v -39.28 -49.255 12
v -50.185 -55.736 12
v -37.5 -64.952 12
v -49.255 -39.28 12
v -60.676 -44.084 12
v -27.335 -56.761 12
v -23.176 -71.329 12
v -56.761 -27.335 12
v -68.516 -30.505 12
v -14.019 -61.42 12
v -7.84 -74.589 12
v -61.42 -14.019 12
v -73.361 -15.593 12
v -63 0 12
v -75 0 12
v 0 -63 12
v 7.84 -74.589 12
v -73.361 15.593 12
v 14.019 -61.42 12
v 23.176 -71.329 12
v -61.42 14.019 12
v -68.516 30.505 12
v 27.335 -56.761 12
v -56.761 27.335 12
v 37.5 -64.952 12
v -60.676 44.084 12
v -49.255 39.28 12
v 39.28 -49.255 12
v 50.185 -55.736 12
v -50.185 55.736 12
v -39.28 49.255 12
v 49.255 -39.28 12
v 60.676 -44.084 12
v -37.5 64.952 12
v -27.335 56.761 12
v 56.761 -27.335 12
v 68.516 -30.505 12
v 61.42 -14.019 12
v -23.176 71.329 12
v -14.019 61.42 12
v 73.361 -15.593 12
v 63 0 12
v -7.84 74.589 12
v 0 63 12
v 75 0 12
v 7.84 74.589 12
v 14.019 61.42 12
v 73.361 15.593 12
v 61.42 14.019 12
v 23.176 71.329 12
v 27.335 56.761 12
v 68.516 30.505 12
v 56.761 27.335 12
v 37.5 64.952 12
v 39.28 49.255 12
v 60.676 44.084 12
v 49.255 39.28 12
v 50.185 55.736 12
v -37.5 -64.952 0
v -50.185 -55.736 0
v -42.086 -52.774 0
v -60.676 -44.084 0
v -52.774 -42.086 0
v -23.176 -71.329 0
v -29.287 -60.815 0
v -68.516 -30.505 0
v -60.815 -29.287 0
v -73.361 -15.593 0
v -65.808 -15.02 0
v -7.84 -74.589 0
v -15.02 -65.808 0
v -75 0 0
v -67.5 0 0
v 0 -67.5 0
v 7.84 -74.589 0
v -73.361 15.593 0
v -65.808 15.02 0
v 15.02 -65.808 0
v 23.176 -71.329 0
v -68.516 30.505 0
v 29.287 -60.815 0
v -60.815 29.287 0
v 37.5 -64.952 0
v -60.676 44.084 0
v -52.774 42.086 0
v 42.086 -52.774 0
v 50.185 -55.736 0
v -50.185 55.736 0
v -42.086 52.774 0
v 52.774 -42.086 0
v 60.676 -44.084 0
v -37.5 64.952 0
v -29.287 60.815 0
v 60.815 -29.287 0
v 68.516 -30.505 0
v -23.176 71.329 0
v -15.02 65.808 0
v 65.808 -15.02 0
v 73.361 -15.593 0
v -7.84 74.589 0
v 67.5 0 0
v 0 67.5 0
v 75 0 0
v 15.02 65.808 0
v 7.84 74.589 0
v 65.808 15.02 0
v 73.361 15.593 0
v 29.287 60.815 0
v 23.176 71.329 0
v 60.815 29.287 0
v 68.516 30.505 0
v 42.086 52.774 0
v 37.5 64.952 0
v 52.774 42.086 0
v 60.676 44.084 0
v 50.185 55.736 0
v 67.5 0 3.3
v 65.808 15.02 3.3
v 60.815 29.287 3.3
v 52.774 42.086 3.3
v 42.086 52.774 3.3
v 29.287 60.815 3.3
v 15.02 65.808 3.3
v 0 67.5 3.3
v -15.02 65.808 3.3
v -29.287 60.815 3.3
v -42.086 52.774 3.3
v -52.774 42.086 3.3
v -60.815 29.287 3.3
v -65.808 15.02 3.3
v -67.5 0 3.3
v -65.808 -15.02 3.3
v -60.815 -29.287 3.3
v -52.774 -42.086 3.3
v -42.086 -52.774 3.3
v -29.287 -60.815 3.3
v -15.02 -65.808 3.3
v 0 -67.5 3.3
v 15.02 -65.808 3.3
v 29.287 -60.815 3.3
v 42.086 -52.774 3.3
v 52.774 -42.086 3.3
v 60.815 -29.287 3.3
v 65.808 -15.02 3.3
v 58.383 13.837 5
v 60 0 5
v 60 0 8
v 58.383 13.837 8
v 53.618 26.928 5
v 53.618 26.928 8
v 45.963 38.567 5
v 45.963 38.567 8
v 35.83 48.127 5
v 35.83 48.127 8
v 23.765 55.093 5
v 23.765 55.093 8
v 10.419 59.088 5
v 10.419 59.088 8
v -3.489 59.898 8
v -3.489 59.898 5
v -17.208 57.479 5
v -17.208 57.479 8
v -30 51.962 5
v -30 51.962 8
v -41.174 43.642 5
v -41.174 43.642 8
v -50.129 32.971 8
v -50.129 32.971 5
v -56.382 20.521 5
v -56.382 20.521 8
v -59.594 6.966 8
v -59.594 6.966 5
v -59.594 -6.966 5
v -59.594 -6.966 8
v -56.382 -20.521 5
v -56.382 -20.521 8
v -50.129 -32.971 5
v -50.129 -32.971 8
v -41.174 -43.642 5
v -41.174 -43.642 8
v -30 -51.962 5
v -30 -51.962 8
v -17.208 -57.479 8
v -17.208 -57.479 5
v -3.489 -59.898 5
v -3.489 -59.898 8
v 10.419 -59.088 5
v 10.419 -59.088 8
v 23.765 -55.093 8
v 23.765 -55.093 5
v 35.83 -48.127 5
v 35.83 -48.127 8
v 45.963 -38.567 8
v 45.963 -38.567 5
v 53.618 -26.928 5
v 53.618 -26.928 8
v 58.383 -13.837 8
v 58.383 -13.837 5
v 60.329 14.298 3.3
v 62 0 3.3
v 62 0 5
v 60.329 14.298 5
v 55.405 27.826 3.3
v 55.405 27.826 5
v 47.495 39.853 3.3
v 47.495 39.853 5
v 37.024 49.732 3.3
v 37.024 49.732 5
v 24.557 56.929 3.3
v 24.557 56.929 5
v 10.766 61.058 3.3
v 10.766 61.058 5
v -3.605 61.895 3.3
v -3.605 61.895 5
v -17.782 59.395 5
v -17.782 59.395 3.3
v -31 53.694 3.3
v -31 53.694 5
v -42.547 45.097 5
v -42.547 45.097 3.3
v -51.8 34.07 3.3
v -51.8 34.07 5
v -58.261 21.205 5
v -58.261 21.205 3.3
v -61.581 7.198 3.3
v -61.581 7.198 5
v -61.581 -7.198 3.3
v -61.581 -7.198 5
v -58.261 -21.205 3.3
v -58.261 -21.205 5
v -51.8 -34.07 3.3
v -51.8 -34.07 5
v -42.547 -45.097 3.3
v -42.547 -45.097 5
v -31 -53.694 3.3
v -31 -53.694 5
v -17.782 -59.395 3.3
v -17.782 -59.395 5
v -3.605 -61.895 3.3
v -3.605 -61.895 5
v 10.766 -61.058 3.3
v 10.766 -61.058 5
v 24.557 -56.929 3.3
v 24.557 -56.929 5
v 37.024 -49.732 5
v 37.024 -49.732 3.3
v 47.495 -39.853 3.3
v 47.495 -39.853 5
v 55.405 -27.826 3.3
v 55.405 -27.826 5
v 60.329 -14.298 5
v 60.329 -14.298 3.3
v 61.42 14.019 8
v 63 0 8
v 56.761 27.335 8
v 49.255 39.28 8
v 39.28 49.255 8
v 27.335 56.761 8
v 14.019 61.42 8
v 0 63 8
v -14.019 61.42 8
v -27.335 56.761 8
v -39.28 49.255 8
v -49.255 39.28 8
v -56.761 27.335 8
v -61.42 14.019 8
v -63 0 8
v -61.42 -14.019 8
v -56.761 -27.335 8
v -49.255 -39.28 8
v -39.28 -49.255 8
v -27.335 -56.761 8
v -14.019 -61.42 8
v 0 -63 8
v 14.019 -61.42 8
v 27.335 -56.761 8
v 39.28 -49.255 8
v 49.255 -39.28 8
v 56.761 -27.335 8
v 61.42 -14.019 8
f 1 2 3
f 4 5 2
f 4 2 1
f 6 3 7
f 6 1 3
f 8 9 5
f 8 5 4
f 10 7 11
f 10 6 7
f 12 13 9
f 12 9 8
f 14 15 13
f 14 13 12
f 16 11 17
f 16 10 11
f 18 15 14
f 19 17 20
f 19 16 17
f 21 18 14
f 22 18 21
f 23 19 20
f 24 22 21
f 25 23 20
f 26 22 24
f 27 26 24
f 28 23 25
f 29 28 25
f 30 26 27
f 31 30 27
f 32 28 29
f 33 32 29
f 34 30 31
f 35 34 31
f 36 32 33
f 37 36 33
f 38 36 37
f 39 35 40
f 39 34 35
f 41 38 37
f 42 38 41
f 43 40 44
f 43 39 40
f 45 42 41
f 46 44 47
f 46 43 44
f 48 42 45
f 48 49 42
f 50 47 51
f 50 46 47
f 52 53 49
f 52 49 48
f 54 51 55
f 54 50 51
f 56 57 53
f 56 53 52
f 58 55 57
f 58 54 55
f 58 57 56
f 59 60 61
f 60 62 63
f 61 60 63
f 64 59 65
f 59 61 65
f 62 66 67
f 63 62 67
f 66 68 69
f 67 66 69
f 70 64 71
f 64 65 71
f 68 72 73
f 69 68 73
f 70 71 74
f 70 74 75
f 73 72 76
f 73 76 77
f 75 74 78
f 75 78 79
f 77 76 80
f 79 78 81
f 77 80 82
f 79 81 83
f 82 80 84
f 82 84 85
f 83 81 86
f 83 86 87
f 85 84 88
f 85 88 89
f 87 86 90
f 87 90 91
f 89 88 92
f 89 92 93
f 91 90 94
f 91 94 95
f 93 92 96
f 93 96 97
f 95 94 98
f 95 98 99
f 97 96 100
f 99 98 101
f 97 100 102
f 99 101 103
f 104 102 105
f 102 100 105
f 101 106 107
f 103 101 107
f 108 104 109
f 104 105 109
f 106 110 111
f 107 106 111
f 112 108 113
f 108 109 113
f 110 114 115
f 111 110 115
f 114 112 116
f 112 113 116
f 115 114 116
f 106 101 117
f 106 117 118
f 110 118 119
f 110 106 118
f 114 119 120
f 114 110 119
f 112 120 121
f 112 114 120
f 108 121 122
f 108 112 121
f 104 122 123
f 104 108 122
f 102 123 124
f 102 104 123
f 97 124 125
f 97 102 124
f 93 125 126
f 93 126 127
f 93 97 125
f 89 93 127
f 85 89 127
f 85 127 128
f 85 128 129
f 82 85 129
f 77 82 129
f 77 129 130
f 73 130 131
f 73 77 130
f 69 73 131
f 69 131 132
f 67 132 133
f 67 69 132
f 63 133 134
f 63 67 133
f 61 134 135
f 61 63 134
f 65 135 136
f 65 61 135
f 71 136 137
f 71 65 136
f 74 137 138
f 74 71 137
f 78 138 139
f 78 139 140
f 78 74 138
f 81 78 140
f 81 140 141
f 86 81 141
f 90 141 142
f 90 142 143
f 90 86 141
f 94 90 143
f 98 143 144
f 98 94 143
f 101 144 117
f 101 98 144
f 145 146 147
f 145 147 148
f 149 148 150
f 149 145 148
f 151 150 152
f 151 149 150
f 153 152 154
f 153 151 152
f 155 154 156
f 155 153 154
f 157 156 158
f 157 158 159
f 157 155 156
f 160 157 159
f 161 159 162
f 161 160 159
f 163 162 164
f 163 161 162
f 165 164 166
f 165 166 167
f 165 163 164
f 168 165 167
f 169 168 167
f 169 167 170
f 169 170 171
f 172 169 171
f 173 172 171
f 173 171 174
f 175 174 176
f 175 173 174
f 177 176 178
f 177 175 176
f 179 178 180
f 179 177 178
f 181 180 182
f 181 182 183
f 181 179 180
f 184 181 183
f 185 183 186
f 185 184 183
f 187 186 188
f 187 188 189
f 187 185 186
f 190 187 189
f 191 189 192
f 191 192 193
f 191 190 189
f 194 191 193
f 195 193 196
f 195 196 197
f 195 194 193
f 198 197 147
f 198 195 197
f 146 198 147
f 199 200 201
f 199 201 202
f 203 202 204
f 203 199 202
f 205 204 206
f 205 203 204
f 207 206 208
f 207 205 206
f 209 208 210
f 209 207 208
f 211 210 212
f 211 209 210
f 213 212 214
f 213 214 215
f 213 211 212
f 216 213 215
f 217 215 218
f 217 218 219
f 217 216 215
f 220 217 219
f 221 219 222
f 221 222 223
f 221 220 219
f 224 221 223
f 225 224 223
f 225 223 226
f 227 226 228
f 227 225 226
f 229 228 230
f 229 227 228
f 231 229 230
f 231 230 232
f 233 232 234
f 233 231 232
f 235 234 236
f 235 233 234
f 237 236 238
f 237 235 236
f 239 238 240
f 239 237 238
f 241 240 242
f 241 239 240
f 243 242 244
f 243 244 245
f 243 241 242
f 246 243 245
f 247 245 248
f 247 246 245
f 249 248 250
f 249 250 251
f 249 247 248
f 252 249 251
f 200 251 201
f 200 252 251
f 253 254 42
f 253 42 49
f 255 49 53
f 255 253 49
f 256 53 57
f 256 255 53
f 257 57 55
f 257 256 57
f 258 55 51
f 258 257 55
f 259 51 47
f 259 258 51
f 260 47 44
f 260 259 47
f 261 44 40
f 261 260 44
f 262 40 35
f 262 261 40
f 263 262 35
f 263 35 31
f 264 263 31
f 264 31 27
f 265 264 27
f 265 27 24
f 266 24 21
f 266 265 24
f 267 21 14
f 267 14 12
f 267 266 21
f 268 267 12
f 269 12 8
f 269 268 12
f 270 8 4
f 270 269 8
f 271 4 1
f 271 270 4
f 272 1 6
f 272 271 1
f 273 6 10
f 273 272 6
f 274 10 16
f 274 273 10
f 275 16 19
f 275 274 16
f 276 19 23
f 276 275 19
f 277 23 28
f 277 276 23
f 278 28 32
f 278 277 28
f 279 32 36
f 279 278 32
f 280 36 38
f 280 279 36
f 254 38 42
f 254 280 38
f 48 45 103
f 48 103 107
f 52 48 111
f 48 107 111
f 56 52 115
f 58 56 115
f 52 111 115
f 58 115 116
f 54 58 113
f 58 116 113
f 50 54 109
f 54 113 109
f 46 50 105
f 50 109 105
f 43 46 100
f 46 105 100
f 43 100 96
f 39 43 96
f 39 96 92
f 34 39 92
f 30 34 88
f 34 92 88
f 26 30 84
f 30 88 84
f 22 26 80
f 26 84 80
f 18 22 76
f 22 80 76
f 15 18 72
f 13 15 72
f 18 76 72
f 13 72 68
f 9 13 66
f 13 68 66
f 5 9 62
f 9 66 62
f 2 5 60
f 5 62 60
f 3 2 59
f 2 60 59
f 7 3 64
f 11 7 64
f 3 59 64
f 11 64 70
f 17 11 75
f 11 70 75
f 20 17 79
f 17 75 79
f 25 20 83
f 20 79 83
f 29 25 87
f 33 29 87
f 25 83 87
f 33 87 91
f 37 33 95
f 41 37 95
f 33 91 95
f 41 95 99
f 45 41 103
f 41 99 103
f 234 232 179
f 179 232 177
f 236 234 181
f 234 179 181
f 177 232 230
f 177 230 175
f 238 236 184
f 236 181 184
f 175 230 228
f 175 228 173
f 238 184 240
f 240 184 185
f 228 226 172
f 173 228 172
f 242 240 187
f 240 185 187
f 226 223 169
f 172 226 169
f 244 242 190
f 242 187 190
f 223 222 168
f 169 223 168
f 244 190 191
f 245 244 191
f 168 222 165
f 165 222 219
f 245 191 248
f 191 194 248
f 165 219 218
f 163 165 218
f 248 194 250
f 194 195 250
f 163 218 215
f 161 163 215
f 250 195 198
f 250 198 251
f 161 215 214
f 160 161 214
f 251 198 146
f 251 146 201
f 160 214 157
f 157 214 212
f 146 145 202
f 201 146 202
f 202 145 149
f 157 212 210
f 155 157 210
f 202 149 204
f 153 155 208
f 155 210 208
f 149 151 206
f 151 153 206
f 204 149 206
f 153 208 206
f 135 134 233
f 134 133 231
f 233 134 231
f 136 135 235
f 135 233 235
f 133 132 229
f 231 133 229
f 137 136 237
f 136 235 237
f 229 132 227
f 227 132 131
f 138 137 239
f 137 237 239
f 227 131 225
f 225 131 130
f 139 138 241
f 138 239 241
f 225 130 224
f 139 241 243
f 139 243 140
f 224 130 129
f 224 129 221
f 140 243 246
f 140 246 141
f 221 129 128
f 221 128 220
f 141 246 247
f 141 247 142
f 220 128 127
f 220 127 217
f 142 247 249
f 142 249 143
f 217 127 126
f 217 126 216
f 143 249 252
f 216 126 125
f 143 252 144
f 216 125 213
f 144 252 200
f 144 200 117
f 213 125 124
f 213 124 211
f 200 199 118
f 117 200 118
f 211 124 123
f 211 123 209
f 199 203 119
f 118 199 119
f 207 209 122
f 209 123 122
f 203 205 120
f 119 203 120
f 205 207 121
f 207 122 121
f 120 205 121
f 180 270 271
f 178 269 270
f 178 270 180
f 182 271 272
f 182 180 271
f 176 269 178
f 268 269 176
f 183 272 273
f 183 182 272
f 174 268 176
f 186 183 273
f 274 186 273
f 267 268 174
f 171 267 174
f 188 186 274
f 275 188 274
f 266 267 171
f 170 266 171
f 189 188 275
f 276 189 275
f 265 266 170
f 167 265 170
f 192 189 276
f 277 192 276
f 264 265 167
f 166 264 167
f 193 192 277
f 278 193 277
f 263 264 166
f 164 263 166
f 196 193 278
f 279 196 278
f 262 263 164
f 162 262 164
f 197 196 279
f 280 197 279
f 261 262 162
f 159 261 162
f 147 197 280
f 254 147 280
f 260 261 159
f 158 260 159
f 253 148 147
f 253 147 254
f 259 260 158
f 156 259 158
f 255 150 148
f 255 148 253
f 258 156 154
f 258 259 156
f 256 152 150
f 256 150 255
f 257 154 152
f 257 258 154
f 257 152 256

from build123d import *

# Parameters (mm, degrees)
SKETCH_1_R           = 75
SKETCH_1_R_2         = 67.5
F_01_CASE_D135_DEPTH = 3.3
SKETCH_2_R           = 75
SKETCH_2_R_2         = 62
F_02_LIP_CONE_DEPTH  = 1.7
SKETCH_3_R           = 75
SKETCH_3_R_2         = 60
F_03_LIP_D120_DEPTH  = 3
SKETCH_4_R           = 75
SKETCH_4_R_2         = 63
F_04_DUST_LIP_DEPTH  = 4


with BuildPart() as part:
    # 草图1 → 01_CASE_D135 (new body)
    with BuildSketch(Plane.XY):
        Circle(SKETCH_1_R)
        Circle(SKETCH_1_R_2, mode=Mode.SUBTRACT)
    extrude(amount=F_01_CASE_D135_DEPTH)

    # 草图2 → 02_LIP_CONE (add)
    with BuildSketch(Plane.XY.offset(3.3)):
        Circle(SKETCH_2_R)
        Circle(SKETCH_2_R_2, mode=Mode.SUBTRACT)
    extrude(amount=F_02_LIP_CONE_DEPTH)

    # 草图3 → 03_LIP_D120 (add)
    with BuildSketch(Plane.XY.offset(5)):
        Circle(SKETCH_3_R)
        Circle(SKETCH_3_R_2, mode=Mode.SUBTRACT)
    extrude(amount=F_03_LIP_D120_DEPTH)

    # 草图4 → 04_DUST_LIP (add)
    with BuildSketch(Plane.XY.offset(8)):
        Circle(SKETCH_4_R)
        Circle(SKETCH_4_R_2, mode=Mode.SUBTRACT)
    extrude(amount=F_04_DUST_LIP_DEPTH)


solid = part.part
